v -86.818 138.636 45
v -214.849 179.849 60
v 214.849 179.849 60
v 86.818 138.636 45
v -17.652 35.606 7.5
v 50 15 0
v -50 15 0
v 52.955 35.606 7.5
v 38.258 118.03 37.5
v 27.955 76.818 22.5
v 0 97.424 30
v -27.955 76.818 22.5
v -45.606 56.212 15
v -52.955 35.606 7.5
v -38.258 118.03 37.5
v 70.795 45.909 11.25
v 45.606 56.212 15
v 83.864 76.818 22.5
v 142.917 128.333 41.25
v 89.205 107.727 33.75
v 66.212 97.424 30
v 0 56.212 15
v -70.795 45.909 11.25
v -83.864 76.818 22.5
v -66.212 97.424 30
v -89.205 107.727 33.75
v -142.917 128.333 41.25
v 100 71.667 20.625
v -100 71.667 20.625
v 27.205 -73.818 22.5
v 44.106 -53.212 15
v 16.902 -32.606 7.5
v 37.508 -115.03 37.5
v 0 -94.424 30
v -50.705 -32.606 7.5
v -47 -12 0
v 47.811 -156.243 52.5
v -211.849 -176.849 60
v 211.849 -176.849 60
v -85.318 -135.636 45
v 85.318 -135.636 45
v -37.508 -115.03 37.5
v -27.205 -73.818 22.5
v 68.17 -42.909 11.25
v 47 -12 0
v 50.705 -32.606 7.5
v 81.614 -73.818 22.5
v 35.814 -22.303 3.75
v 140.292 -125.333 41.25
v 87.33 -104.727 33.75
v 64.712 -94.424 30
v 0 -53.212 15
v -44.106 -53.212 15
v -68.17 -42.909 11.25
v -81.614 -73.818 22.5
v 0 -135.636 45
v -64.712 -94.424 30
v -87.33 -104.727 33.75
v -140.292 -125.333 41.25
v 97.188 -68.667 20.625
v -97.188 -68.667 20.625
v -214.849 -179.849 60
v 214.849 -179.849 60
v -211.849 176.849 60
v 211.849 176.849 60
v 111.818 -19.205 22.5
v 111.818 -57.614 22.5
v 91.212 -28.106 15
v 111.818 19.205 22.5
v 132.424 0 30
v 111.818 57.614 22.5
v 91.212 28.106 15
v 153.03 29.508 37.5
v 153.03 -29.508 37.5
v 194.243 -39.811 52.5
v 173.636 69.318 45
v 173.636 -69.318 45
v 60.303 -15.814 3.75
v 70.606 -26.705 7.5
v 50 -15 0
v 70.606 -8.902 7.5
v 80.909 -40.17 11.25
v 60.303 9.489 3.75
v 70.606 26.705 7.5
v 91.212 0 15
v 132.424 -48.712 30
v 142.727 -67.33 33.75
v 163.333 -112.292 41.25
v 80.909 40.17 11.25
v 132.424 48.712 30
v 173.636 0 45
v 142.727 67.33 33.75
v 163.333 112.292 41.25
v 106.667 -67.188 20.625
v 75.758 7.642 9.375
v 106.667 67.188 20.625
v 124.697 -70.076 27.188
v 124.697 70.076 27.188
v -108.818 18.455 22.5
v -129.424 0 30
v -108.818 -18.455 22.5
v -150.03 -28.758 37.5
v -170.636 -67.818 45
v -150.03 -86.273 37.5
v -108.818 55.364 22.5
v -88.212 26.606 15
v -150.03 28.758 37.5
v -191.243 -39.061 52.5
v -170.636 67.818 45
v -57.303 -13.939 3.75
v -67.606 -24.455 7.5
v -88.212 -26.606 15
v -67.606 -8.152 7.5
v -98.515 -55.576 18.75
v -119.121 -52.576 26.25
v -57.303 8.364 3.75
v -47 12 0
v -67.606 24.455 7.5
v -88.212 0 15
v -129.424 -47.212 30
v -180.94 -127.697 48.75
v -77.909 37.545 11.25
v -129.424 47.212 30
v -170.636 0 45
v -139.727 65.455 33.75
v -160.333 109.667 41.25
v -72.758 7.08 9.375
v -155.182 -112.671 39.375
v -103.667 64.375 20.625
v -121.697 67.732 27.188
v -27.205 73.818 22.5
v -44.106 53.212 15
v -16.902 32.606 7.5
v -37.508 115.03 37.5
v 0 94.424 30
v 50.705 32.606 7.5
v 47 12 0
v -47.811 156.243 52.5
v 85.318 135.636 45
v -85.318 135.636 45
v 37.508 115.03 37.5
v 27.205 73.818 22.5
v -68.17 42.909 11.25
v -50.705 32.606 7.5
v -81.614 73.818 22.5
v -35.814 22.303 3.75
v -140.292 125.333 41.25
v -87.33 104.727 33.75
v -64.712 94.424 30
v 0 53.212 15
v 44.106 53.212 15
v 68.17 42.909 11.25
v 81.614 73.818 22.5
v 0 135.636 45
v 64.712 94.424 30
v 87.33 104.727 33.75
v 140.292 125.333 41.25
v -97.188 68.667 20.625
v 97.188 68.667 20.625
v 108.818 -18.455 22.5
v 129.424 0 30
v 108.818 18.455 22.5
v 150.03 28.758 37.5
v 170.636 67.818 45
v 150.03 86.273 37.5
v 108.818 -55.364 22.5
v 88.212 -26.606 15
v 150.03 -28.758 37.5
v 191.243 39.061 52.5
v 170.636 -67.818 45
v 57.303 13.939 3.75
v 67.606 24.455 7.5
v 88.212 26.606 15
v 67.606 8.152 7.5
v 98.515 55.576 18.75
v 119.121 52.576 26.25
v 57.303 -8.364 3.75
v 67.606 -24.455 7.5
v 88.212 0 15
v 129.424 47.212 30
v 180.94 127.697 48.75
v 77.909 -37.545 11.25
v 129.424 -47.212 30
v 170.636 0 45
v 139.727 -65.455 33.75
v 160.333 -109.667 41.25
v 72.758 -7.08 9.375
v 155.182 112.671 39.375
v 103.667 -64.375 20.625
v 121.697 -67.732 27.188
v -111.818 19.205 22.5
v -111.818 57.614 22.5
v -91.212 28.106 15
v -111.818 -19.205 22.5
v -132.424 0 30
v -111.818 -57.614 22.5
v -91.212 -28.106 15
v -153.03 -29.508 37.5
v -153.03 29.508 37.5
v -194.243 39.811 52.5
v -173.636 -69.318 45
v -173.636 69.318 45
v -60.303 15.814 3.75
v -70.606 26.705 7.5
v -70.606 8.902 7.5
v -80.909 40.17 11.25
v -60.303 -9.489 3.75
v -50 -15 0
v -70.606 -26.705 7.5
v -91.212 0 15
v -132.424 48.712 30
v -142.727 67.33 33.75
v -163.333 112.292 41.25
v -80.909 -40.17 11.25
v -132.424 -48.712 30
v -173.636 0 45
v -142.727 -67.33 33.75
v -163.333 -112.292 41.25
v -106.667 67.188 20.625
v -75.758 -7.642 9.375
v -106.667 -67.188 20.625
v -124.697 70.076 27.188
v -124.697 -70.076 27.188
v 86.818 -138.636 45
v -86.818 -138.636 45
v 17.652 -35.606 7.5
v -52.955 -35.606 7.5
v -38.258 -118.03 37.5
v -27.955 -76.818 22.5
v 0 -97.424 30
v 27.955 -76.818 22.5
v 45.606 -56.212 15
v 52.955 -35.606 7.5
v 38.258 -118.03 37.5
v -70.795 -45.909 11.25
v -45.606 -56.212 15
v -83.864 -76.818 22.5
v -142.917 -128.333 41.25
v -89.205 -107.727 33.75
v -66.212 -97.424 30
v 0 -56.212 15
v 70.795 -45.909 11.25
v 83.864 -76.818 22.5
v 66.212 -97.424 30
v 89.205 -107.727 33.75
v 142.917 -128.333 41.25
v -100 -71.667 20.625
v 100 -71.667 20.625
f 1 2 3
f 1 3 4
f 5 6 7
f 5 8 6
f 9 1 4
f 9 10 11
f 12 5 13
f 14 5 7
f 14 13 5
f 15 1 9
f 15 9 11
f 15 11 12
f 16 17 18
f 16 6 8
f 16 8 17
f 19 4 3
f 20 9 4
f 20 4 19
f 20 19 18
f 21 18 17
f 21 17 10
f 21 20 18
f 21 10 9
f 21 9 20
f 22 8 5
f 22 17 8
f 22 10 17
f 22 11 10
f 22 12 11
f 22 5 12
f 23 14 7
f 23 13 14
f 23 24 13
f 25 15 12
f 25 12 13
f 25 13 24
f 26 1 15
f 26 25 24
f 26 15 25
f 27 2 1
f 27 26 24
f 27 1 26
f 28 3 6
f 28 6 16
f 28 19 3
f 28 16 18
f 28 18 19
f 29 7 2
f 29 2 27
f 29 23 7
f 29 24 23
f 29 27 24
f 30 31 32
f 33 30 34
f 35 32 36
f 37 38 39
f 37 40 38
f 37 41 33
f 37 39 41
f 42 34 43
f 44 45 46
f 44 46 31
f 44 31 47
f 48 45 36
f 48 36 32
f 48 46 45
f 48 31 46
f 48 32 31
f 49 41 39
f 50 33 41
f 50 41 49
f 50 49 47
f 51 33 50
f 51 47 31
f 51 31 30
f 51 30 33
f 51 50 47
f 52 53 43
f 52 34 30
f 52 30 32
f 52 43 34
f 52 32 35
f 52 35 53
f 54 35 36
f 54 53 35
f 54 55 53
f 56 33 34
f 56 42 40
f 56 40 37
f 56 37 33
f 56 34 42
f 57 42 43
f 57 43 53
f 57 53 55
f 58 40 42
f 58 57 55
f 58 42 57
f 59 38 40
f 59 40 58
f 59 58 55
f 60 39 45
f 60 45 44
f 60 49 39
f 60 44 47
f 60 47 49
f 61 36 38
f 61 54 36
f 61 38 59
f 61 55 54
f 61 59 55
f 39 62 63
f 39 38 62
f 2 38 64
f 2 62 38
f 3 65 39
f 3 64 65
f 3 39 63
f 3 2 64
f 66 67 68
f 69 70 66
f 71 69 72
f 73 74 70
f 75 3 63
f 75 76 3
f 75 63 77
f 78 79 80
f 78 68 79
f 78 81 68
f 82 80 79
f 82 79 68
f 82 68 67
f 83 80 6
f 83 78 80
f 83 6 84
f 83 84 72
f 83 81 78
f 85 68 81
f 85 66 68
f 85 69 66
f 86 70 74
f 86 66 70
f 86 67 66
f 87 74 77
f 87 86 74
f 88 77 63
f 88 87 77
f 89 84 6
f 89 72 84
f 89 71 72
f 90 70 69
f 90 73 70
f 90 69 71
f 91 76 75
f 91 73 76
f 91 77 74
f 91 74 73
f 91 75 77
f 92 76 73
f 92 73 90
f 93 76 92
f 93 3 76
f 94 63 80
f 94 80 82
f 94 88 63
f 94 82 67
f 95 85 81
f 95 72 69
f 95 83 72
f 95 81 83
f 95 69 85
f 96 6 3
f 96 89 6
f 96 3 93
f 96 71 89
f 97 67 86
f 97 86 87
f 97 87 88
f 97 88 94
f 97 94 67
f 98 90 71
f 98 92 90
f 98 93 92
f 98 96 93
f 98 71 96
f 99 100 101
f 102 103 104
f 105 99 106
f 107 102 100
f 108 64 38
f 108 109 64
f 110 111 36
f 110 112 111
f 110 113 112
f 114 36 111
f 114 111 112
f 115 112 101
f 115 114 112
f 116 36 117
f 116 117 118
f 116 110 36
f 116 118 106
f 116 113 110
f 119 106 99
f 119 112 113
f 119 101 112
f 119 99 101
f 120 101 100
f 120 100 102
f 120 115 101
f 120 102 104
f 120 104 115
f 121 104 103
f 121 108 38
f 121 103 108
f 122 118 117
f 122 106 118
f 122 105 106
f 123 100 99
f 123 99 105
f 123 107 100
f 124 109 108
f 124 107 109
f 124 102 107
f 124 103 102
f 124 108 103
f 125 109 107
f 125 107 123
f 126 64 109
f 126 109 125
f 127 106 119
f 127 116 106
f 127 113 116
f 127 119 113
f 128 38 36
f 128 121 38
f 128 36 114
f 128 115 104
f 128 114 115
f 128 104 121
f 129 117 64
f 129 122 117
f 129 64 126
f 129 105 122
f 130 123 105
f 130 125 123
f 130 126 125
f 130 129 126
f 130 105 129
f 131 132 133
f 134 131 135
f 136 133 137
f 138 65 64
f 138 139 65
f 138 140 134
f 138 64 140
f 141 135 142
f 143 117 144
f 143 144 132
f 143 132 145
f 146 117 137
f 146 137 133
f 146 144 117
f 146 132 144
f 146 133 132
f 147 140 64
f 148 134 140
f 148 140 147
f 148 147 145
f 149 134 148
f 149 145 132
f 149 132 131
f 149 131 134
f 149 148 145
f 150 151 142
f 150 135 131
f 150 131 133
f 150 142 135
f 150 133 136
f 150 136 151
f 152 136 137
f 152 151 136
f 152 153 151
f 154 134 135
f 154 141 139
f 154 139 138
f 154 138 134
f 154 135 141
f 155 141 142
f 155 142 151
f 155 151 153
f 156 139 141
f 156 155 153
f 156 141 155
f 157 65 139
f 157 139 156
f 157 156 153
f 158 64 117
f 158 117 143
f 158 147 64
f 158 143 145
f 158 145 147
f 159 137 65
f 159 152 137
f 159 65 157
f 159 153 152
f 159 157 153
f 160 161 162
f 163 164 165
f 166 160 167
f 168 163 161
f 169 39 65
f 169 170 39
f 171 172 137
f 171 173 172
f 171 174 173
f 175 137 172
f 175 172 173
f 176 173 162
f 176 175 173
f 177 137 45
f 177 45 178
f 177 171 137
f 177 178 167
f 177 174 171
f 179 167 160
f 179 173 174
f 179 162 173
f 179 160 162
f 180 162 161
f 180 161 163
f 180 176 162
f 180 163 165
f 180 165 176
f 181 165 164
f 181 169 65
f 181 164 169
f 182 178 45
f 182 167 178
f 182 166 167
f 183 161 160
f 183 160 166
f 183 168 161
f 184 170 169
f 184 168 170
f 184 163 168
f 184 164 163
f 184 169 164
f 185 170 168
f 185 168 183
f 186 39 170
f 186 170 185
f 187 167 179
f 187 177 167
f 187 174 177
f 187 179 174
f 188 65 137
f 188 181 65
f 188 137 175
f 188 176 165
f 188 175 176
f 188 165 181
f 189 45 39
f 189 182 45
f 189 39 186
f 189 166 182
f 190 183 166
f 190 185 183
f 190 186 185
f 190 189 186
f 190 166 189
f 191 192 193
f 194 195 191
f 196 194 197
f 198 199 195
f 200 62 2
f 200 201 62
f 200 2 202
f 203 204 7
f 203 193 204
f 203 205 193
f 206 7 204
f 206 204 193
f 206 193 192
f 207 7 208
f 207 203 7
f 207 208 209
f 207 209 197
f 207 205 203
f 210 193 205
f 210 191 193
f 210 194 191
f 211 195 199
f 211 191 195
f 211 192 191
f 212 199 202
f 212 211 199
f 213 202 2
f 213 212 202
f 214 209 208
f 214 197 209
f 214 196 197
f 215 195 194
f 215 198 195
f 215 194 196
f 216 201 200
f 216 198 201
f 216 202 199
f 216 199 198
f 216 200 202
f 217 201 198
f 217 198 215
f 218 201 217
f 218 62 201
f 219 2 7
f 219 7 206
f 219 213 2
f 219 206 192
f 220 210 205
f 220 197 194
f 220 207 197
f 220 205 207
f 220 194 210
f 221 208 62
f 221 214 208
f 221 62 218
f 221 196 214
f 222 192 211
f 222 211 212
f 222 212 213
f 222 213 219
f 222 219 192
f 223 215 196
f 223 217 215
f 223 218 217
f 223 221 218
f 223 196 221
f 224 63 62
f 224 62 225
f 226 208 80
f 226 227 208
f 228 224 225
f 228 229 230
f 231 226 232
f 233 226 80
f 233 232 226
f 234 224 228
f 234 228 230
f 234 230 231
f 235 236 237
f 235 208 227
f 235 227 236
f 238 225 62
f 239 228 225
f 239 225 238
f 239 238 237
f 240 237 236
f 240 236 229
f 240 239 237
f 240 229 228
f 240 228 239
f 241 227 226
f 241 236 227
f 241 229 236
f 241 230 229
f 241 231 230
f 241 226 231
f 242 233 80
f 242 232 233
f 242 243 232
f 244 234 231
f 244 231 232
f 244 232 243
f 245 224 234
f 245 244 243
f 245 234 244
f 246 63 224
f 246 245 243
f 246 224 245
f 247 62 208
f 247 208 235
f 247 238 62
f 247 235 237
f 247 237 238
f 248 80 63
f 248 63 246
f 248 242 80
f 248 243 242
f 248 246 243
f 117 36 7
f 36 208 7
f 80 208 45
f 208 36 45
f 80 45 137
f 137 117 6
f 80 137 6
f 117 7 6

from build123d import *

# Parameters (mm, degrees)
CROQUIS1_W              = 100
CROQUIS1_H              = 30
SALIENTE_EXTRUIR1_DEPTH = 60
SALIENTE_EXTRUIR1_TAPER = -70
CROQUIS2_W              = 94
CROQUIS2_H              = 24
CORTAR_EXTRUIR1_DEPTH   = 60
CORTAR_EXTRUIR1_TAPER   = -70


with BuildPart() as part:
    # Croquis1 → Saliente-Extruir1 (new body)
    with BuildSketch(Plane.XY):
        Rectangle(CROQUIS1_W, CROQUIS1_H)
    extrude(amount=SALIENTE_EXTRUIR1_DEPTH, taper=SALIENTE_EXTRUIR1_TAPER)

    # Croquis2 → Cortar-Extruir1 (cut)
    with BuildSketch(Plane(origin=(0, 0, 0), x_dir=(-1, 0, 0), z_dir=(0, 0, -1))):
        Rectangle(CROQUIS2_W, CROQUIS2_H)
    extrude(amount=-CORTAR_EXTRUIR1_DEPTH, taper=CORTAR_EXTRUIR1_TAPER, mode=Mode.SUBTRACT)


solid = part.part
